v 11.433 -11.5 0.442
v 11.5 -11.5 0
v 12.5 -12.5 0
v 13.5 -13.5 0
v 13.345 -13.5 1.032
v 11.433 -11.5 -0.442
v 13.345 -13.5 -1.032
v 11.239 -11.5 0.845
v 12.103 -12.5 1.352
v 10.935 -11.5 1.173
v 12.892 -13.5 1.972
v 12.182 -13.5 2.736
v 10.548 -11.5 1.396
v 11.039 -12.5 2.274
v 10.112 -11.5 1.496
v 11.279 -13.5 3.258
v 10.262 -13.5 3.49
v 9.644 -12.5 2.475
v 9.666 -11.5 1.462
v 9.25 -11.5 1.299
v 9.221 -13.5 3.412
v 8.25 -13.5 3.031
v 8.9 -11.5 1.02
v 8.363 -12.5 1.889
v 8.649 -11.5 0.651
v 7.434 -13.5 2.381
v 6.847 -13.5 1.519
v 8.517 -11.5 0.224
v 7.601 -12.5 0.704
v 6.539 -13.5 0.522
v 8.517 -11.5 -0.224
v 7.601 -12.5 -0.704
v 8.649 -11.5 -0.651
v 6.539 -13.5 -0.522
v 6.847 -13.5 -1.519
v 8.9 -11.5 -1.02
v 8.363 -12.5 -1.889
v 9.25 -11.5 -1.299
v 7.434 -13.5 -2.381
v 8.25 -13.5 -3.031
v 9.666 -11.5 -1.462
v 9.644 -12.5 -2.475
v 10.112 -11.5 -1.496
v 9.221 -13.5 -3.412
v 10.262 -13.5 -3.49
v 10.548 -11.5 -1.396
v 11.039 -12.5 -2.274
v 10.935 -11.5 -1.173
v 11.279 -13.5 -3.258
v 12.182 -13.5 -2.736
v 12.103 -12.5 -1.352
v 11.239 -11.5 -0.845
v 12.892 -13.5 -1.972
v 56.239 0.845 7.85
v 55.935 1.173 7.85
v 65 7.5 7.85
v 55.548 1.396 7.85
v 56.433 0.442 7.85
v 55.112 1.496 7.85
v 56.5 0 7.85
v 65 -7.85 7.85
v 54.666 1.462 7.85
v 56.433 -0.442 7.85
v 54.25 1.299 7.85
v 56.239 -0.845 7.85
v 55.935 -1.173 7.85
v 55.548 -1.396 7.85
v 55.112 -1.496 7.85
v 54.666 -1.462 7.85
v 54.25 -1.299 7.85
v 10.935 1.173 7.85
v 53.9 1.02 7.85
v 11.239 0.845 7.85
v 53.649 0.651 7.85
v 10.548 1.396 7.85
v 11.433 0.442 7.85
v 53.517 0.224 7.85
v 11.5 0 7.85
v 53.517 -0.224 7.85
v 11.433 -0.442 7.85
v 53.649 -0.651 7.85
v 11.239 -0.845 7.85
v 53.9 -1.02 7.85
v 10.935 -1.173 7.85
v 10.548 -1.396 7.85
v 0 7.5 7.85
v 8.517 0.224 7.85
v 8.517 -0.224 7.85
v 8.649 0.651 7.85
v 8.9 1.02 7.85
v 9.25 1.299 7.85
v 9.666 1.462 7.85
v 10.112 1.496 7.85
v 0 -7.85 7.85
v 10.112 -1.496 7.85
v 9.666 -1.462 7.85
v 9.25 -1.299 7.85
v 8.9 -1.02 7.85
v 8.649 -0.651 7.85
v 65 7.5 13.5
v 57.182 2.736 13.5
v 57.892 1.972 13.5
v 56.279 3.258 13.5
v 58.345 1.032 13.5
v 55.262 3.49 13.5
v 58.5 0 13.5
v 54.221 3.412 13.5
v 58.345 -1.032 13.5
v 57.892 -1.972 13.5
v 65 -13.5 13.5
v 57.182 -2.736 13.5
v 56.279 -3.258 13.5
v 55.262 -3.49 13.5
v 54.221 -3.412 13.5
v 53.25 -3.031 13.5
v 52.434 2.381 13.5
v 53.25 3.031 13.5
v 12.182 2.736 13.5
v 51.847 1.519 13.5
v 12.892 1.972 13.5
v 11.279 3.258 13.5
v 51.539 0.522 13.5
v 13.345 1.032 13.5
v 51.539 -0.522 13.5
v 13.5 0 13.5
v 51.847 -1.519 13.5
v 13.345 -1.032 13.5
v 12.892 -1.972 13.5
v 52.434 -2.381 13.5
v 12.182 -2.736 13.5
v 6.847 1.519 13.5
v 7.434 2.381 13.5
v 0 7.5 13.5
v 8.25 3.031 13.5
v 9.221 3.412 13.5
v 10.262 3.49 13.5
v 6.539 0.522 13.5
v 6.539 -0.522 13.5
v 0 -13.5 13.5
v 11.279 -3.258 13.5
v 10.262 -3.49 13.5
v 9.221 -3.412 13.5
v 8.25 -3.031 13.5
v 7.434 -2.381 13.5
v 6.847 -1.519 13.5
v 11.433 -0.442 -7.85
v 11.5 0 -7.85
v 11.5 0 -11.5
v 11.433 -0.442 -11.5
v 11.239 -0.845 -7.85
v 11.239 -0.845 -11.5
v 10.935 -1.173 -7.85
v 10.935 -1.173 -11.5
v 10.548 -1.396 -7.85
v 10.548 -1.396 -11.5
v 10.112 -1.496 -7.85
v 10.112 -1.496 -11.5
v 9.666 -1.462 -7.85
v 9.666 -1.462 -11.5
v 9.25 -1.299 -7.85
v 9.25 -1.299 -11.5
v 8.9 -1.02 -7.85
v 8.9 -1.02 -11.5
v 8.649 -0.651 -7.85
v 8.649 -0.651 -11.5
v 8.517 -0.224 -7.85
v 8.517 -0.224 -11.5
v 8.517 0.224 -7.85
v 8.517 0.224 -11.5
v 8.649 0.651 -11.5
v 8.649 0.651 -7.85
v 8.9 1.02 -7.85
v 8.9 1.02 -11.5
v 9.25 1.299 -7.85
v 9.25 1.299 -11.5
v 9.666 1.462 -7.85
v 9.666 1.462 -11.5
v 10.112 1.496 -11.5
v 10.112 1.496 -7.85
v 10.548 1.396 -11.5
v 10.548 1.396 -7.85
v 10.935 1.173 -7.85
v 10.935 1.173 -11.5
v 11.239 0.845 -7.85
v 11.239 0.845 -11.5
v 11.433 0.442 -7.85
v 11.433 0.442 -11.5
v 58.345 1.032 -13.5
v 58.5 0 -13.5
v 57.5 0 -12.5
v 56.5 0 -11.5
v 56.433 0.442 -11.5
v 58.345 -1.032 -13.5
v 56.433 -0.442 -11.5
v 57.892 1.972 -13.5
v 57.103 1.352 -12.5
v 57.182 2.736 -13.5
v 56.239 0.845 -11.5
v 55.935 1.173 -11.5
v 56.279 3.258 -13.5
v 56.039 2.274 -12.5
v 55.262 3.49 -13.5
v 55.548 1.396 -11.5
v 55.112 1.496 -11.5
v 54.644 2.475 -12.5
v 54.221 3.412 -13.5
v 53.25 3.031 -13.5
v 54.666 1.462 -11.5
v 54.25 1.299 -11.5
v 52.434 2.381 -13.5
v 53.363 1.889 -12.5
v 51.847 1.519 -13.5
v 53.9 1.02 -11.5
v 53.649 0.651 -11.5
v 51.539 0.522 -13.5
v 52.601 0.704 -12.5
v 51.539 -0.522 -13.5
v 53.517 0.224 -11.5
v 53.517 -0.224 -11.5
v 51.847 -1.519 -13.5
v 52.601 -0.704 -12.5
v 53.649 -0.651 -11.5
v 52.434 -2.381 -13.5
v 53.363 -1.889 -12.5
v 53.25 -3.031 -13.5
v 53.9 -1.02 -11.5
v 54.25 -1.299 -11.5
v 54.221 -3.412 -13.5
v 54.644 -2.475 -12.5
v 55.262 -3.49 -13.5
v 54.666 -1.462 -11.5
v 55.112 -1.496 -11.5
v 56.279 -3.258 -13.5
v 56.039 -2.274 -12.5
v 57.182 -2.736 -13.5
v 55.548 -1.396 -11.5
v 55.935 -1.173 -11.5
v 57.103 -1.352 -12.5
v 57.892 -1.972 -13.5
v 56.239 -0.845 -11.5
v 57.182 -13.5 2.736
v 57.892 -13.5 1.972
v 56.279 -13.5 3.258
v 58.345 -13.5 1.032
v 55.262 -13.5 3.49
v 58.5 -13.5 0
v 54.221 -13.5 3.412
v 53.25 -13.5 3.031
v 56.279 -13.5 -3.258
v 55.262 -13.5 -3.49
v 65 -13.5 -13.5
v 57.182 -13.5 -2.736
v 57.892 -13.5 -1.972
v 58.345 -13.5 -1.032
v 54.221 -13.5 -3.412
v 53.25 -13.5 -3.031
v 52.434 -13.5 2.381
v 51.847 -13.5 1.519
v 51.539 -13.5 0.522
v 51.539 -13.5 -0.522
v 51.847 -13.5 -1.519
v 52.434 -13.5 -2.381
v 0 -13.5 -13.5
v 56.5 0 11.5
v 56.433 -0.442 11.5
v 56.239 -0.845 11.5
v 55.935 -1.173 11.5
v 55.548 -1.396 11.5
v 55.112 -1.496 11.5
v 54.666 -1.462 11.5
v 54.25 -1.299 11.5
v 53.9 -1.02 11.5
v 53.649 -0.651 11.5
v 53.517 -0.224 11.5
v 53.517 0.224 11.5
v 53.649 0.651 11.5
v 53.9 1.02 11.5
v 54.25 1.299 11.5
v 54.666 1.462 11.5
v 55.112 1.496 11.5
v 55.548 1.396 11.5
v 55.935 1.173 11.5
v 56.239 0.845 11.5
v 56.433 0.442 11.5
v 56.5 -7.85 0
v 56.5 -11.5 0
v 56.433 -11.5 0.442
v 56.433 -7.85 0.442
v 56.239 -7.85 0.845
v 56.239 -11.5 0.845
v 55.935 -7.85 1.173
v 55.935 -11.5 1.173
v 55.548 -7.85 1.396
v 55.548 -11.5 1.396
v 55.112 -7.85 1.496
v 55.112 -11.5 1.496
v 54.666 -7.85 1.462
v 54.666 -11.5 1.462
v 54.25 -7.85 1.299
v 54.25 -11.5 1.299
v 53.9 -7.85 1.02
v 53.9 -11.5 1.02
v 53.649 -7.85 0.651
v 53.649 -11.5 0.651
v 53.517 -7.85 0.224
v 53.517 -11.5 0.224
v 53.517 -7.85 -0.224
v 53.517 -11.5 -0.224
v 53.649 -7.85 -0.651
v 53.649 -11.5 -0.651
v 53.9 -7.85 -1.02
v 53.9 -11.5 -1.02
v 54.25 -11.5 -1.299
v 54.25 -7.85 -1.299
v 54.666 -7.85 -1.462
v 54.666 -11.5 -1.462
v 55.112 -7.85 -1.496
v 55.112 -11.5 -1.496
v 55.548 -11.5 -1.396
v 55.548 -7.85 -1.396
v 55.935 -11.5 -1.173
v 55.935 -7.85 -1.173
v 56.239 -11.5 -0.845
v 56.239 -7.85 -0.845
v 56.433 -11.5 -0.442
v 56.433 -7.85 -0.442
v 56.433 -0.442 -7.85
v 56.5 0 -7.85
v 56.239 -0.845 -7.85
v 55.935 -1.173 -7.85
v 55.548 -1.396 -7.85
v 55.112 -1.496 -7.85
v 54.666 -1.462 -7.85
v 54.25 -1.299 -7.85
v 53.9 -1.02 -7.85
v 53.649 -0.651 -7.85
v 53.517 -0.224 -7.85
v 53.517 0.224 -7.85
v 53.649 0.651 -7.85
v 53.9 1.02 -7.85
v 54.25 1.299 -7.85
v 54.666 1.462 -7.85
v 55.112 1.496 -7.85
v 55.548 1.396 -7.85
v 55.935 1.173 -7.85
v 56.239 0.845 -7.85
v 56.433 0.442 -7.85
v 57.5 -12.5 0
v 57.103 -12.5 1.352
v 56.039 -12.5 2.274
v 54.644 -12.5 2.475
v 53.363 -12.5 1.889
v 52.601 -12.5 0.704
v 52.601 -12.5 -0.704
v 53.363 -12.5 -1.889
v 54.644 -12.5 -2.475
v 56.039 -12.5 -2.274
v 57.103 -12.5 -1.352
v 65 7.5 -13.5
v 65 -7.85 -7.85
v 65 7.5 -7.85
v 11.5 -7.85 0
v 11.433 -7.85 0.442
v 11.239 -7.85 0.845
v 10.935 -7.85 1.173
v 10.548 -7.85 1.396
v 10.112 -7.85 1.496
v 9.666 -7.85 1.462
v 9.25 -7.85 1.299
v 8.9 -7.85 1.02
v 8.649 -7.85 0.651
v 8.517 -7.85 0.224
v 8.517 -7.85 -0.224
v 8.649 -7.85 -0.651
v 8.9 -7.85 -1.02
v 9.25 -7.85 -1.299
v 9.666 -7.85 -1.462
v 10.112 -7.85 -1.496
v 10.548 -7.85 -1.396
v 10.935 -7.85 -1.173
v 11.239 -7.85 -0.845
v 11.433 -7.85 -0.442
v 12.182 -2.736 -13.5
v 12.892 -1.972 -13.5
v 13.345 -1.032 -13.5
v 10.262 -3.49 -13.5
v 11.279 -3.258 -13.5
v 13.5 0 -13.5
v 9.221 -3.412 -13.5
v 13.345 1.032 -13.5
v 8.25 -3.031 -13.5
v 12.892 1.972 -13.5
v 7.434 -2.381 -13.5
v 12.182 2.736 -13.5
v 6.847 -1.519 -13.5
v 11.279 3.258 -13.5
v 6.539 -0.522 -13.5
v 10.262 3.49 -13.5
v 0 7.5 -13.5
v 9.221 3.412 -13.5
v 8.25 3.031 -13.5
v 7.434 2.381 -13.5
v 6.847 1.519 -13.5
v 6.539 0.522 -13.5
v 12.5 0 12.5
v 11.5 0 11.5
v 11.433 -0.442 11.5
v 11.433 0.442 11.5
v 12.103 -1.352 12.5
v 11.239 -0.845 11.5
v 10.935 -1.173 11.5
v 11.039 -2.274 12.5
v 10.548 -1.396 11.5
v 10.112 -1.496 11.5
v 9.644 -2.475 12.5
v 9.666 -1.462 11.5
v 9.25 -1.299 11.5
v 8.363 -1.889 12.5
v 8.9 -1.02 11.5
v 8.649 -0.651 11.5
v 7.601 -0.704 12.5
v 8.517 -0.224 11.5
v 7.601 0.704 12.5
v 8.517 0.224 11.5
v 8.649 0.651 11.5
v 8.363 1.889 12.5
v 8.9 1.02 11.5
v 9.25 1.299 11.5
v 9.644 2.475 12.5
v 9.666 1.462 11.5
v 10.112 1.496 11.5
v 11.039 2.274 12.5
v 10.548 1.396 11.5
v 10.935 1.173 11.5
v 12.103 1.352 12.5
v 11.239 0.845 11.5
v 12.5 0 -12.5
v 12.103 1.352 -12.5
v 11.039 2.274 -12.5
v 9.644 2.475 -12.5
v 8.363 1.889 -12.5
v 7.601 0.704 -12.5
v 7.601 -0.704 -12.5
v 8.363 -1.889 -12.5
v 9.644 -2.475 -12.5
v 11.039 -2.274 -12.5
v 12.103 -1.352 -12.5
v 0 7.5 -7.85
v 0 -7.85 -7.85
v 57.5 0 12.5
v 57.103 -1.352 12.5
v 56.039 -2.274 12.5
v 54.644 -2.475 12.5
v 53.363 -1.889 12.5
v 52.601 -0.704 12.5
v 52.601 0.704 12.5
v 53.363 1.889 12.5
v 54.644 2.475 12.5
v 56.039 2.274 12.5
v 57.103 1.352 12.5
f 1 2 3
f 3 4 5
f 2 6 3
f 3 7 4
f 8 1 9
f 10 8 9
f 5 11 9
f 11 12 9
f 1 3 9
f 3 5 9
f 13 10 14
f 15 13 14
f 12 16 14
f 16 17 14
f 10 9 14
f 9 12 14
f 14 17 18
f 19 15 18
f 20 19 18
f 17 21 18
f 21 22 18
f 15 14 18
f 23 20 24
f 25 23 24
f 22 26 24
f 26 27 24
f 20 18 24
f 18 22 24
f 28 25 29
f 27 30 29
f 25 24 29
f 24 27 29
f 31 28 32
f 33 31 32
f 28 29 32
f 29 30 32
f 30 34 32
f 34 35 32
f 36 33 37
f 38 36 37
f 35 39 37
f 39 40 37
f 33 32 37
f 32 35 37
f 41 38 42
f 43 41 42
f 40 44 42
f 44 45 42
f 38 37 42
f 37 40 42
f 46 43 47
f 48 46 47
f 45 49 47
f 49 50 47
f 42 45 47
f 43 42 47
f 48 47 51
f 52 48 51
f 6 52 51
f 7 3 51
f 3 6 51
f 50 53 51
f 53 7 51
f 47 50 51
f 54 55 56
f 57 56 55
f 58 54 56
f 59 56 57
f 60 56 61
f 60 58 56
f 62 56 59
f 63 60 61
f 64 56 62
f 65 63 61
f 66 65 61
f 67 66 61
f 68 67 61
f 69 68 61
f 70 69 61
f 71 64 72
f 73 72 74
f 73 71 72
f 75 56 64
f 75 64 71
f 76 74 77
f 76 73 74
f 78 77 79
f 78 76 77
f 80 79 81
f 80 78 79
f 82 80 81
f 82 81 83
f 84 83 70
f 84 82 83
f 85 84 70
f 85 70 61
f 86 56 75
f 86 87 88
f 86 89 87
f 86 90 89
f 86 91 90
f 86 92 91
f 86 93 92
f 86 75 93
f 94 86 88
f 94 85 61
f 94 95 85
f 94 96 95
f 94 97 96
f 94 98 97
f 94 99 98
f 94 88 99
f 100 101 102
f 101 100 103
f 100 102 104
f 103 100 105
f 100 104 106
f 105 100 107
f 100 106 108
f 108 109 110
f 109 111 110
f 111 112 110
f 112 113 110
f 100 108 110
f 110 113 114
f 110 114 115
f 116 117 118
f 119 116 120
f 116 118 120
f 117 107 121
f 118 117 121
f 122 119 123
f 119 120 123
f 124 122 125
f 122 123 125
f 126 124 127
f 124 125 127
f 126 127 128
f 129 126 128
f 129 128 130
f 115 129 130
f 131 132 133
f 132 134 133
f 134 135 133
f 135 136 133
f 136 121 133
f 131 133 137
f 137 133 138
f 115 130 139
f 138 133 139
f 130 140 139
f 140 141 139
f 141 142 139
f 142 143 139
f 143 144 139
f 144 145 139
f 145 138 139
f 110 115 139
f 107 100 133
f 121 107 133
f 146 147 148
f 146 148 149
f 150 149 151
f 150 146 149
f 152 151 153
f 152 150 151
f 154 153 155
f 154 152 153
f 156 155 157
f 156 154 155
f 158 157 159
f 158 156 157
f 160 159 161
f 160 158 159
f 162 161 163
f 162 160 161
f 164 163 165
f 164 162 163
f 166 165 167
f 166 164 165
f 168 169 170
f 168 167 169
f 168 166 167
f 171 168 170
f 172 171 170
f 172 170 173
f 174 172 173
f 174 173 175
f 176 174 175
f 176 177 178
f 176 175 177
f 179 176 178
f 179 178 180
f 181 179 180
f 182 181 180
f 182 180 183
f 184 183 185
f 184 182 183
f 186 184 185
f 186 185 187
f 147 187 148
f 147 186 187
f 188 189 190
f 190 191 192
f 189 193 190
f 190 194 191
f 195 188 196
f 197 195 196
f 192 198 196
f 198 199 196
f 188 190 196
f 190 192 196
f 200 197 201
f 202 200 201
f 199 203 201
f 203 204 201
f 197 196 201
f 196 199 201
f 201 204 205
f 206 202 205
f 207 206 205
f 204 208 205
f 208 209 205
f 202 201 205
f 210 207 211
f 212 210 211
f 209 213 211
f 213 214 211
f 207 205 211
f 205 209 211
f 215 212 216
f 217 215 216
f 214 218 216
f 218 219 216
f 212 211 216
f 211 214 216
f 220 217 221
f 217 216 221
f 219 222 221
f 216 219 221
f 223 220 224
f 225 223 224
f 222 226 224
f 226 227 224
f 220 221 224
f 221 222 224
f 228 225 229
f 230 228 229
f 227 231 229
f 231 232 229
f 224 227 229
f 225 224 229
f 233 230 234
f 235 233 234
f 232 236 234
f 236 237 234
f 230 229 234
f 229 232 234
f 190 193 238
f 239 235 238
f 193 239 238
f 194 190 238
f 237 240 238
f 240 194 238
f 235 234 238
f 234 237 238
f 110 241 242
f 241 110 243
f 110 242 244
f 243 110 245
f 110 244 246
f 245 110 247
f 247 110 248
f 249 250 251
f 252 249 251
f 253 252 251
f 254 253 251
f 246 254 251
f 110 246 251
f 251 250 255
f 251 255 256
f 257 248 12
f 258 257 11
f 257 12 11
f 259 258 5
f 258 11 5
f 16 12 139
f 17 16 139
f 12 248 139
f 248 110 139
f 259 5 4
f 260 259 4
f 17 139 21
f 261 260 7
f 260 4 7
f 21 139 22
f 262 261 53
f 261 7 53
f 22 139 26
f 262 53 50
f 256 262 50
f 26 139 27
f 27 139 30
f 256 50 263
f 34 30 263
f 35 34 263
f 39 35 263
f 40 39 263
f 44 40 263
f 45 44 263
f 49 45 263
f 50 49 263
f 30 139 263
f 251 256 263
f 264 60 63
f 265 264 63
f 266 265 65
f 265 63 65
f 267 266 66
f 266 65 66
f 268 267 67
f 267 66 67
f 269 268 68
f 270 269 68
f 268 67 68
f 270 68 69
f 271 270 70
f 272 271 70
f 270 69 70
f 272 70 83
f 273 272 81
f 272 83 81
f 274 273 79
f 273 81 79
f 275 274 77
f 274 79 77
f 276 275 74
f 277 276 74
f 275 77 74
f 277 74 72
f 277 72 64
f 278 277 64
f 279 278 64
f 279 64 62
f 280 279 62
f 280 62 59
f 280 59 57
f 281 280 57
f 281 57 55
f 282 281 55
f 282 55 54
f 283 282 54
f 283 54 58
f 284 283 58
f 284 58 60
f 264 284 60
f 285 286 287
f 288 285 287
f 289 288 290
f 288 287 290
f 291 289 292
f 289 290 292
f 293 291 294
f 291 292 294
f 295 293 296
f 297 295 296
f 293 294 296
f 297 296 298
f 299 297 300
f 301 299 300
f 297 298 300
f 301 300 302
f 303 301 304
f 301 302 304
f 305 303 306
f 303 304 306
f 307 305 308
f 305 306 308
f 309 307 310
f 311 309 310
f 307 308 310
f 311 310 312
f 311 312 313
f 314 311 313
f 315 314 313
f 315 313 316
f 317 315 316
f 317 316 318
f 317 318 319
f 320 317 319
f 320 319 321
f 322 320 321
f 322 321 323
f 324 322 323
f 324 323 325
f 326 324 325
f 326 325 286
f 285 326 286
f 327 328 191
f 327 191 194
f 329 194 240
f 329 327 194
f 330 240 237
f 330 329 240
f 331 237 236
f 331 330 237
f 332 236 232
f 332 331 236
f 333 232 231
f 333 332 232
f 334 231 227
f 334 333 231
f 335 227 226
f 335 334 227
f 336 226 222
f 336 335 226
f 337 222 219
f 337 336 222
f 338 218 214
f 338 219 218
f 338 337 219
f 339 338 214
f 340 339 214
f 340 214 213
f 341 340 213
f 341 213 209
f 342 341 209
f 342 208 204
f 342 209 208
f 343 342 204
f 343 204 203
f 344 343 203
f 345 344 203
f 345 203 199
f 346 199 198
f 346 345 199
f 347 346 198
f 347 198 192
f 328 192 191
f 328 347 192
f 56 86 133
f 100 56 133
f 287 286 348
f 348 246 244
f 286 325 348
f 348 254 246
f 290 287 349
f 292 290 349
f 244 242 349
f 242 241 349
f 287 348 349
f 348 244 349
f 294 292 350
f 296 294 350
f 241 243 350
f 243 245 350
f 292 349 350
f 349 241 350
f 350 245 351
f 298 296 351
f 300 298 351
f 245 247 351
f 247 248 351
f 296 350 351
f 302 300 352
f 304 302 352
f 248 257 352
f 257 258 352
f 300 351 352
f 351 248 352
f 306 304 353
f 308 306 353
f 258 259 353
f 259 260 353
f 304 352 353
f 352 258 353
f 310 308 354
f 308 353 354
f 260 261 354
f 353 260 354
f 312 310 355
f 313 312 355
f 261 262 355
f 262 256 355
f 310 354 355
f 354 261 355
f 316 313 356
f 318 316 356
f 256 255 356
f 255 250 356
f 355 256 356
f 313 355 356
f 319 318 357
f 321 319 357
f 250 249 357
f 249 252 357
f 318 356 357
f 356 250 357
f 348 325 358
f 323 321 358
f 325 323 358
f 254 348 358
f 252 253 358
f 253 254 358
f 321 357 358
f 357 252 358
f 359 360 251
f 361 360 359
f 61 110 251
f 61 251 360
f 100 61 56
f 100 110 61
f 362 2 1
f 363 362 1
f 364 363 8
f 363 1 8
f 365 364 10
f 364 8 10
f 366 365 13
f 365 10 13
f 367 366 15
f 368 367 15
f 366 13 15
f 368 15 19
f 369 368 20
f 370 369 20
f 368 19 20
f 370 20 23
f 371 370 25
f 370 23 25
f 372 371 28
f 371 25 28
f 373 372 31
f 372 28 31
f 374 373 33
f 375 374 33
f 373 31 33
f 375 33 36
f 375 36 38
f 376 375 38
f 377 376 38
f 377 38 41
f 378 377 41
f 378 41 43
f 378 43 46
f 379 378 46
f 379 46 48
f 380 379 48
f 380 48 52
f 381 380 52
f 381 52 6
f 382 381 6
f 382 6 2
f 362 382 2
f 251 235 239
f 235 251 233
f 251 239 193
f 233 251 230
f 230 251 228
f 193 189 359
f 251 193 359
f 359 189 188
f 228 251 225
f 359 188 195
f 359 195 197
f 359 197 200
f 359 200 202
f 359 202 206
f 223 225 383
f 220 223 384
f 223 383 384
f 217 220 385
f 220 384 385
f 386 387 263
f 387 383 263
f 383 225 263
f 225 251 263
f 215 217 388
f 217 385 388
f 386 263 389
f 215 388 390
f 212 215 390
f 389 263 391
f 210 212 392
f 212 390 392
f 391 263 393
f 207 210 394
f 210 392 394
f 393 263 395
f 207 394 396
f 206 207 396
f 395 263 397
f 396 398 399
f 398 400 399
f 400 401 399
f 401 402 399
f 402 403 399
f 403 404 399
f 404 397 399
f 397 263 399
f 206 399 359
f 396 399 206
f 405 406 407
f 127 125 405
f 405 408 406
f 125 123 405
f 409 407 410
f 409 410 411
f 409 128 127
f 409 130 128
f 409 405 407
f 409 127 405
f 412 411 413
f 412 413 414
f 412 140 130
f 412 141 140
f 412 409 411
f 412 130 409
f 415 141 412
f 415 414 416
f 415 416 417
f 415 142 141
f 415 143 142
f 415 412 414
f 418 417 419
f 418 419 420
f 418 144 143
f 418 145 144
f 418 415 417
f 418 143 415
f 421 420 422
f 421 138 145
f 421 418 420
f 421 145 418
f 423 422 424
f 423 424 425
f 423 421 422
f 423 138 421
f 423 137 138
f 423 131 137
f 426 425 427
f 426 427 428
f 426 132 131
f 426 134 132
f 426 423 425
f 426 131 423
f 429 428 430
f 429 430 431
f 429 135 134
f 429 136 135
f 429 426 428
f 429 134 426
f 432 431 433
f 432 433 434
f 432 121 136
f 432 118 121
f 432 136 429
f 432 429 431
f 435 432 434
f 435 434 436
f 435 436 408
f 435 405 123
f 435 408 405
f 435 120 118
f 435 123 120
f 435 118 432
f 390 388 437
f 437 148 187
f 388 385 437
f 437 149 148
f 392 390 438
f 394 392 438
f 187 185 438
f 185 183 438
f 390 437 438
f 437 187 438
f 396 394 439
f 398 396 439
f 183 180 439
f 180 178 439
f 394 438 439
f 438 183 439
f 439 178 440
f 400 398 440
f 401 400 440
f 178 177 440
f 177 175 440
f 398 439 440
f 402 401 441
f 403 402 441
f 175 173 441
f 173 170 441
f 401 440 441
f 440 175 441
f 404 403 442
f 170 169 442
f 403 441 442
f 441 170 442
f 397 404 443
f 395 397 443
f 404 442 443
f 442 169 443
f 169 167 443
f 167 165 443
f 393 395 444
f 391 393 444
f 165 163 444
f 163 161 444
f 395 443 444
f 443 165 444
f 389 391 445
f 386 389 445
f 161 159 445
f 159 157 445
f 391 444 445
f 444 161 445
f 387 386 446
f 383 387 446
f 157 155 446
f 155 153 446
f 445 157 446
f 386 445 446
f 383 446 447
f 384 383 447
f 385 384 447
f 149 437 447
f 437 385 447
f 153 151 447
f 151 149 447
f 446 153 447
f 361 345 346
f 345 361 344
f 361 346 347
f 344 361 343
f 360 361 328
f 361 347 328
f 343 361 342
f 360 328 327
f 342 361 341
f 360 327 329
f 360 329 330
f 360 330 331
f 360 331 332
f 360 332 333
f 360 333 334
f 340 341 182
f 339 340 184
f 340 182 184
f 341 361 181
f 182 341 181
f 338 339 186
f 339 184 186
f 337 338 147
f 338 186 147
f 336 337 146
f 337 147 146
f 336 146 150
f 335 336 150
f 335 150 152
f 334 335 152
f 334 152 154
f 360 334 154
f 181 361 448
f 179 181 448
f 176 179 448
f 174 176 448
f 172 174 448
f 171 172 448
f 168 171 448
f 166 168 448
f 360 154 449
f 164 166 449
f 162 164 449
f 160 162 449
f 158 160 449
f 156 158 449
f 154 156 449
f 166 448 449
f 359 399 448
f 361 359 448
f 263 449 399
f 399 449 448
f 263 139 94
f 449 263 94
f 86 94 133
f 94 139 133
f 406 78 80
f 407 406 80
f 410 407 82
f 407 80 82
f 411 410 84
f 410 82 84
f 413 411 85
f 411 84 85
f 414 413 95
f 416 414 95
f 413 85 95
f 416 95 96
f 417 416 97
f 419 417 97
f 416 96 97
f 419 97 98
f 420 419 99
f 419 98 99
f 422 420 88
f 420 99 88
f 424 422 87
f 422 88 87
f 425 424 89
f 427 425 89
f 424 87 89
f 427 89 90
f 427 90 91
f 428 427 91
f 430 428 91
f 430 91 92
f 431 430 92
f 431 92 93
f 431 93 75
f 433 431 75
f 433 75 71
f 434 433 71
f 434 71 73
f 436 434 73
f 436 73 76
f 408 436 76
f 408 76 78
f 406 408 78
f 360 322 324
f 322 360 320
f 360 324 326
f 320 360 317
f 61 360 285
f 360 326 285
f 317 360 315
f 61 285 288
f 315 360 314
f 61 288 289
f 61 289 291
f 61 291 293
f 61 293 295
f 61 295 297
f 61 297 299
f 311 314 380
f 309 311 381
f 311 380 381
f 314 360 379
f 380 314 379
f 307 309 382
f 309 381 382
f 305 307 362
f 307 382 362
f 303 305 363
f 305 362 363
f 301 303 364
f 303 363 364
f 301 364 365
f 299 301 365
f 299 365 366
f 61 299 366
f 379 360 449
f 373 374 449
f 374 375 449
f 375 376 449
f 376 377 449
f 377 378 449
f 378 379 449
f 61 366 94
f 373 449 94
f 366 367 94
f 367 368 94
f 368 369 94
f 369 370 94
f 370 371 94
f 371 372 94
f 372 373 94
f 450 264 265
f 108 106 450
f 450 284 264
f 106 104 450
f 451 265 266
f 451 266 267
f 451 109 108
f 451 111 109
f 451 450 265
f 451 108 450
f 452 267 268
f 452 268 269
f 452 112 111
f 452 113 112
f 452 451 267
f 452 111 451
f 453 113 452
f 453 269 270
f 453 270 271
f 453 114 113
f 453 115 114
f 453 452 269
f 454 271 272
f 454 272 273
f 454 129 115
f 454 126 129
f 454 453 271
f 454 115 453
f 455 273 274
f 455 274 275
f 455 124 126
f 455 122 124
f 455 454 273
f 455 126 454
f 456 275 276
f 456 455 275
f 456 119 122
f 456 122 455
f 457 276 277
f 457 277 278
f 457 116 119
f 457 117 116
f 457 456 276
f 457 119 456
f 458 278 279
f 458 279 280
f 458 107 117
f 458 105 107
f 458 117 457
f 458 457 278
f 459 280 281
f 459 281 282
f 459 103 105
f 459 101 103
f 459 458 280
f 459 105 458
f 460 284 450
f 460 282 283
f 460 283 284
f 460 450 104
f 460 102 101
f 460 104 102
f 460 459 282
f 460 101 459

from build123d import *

# Parameters (mm, degrees)
F1_DEPTH      = 65
F2_R          = 1.5
F3_DEPTH      = 21.001
F4_R          = 1.5
F5_DEPTH      = 21.001
F5_DEPTH_BACK = 6.001
F6_SIZE       = 2
F7_W          = 15.7
F7_H          = 15.7
F8_DEPTH      = 65.001


with BuildPart() as f1:
    # F0 (on Right) → F1 (new body)
    with BuildSketch(Plane.YZ):
        Polygon((-7.5, 7.5), (7.5, 7.5), (7.5, 13.5), (-13.5, 13.5), (-13.5, -13.5), (7.5, -13.5), (7.5, -7.5), (-7.5, -7.5), align=None)
    extrude(amount=F1_DEPTH)

    # F2 (on face) → F3 (cut, through all)
    with BuildSketch(Plane.XZ.offset(13.5)):
        with Locations((10, 0)):
            Circle(F2_R)
        with Locations((55, 0)):
            Circle(F2_R)
    extrude(amount=-F3_DEPTH, mode=Mode.SUBTRACT)

    # F4 (on face) → F5 (cut, two sides)
    with BuildSketch(Plane(origin=(0, 0, 7.5), x_dir=(1, 0, 0), z_dir=(0, 0, -1))) as f5_sk:
        with Locations((55, 0)):
            Circle(F4_R)
        with Locations((10, 0)):
            Circle(F4_R)
    extrude(amount=F5_DEPTH, mode=Mode.SUBTRACT)
    extrude(f5_sk.sketch, amount=-F5_DEPTH_BACK, mode=Mode.SUBTRACT)

    # F6
    f6_edges = [f1.edges().sort_by_distance(p)[0] for p in [
        (53.5, 0, 13.5),
        (8.5, 0, 13.5),
        (8.5, -13.5, 0),
        (53.5, -13.5, 0),
        (53.5, 0, -13.5),
        (8.5, 0, -13.5),
    ]]
    chamfer(f6_edges, length=F6_SIZE)

    # F7 (on face) → F8 (cut, through all)
    with BuildSketch(Plane(origin=(0, 0, 0), x_dir=(0, -1, 0), z_dir=(-1, 0, 0))):
        Rectangle(F7_W, F7_H)
    extrude(amount=-F8_DEPTH, mode=Mode.SUBTRACT)


solid = f1.part
